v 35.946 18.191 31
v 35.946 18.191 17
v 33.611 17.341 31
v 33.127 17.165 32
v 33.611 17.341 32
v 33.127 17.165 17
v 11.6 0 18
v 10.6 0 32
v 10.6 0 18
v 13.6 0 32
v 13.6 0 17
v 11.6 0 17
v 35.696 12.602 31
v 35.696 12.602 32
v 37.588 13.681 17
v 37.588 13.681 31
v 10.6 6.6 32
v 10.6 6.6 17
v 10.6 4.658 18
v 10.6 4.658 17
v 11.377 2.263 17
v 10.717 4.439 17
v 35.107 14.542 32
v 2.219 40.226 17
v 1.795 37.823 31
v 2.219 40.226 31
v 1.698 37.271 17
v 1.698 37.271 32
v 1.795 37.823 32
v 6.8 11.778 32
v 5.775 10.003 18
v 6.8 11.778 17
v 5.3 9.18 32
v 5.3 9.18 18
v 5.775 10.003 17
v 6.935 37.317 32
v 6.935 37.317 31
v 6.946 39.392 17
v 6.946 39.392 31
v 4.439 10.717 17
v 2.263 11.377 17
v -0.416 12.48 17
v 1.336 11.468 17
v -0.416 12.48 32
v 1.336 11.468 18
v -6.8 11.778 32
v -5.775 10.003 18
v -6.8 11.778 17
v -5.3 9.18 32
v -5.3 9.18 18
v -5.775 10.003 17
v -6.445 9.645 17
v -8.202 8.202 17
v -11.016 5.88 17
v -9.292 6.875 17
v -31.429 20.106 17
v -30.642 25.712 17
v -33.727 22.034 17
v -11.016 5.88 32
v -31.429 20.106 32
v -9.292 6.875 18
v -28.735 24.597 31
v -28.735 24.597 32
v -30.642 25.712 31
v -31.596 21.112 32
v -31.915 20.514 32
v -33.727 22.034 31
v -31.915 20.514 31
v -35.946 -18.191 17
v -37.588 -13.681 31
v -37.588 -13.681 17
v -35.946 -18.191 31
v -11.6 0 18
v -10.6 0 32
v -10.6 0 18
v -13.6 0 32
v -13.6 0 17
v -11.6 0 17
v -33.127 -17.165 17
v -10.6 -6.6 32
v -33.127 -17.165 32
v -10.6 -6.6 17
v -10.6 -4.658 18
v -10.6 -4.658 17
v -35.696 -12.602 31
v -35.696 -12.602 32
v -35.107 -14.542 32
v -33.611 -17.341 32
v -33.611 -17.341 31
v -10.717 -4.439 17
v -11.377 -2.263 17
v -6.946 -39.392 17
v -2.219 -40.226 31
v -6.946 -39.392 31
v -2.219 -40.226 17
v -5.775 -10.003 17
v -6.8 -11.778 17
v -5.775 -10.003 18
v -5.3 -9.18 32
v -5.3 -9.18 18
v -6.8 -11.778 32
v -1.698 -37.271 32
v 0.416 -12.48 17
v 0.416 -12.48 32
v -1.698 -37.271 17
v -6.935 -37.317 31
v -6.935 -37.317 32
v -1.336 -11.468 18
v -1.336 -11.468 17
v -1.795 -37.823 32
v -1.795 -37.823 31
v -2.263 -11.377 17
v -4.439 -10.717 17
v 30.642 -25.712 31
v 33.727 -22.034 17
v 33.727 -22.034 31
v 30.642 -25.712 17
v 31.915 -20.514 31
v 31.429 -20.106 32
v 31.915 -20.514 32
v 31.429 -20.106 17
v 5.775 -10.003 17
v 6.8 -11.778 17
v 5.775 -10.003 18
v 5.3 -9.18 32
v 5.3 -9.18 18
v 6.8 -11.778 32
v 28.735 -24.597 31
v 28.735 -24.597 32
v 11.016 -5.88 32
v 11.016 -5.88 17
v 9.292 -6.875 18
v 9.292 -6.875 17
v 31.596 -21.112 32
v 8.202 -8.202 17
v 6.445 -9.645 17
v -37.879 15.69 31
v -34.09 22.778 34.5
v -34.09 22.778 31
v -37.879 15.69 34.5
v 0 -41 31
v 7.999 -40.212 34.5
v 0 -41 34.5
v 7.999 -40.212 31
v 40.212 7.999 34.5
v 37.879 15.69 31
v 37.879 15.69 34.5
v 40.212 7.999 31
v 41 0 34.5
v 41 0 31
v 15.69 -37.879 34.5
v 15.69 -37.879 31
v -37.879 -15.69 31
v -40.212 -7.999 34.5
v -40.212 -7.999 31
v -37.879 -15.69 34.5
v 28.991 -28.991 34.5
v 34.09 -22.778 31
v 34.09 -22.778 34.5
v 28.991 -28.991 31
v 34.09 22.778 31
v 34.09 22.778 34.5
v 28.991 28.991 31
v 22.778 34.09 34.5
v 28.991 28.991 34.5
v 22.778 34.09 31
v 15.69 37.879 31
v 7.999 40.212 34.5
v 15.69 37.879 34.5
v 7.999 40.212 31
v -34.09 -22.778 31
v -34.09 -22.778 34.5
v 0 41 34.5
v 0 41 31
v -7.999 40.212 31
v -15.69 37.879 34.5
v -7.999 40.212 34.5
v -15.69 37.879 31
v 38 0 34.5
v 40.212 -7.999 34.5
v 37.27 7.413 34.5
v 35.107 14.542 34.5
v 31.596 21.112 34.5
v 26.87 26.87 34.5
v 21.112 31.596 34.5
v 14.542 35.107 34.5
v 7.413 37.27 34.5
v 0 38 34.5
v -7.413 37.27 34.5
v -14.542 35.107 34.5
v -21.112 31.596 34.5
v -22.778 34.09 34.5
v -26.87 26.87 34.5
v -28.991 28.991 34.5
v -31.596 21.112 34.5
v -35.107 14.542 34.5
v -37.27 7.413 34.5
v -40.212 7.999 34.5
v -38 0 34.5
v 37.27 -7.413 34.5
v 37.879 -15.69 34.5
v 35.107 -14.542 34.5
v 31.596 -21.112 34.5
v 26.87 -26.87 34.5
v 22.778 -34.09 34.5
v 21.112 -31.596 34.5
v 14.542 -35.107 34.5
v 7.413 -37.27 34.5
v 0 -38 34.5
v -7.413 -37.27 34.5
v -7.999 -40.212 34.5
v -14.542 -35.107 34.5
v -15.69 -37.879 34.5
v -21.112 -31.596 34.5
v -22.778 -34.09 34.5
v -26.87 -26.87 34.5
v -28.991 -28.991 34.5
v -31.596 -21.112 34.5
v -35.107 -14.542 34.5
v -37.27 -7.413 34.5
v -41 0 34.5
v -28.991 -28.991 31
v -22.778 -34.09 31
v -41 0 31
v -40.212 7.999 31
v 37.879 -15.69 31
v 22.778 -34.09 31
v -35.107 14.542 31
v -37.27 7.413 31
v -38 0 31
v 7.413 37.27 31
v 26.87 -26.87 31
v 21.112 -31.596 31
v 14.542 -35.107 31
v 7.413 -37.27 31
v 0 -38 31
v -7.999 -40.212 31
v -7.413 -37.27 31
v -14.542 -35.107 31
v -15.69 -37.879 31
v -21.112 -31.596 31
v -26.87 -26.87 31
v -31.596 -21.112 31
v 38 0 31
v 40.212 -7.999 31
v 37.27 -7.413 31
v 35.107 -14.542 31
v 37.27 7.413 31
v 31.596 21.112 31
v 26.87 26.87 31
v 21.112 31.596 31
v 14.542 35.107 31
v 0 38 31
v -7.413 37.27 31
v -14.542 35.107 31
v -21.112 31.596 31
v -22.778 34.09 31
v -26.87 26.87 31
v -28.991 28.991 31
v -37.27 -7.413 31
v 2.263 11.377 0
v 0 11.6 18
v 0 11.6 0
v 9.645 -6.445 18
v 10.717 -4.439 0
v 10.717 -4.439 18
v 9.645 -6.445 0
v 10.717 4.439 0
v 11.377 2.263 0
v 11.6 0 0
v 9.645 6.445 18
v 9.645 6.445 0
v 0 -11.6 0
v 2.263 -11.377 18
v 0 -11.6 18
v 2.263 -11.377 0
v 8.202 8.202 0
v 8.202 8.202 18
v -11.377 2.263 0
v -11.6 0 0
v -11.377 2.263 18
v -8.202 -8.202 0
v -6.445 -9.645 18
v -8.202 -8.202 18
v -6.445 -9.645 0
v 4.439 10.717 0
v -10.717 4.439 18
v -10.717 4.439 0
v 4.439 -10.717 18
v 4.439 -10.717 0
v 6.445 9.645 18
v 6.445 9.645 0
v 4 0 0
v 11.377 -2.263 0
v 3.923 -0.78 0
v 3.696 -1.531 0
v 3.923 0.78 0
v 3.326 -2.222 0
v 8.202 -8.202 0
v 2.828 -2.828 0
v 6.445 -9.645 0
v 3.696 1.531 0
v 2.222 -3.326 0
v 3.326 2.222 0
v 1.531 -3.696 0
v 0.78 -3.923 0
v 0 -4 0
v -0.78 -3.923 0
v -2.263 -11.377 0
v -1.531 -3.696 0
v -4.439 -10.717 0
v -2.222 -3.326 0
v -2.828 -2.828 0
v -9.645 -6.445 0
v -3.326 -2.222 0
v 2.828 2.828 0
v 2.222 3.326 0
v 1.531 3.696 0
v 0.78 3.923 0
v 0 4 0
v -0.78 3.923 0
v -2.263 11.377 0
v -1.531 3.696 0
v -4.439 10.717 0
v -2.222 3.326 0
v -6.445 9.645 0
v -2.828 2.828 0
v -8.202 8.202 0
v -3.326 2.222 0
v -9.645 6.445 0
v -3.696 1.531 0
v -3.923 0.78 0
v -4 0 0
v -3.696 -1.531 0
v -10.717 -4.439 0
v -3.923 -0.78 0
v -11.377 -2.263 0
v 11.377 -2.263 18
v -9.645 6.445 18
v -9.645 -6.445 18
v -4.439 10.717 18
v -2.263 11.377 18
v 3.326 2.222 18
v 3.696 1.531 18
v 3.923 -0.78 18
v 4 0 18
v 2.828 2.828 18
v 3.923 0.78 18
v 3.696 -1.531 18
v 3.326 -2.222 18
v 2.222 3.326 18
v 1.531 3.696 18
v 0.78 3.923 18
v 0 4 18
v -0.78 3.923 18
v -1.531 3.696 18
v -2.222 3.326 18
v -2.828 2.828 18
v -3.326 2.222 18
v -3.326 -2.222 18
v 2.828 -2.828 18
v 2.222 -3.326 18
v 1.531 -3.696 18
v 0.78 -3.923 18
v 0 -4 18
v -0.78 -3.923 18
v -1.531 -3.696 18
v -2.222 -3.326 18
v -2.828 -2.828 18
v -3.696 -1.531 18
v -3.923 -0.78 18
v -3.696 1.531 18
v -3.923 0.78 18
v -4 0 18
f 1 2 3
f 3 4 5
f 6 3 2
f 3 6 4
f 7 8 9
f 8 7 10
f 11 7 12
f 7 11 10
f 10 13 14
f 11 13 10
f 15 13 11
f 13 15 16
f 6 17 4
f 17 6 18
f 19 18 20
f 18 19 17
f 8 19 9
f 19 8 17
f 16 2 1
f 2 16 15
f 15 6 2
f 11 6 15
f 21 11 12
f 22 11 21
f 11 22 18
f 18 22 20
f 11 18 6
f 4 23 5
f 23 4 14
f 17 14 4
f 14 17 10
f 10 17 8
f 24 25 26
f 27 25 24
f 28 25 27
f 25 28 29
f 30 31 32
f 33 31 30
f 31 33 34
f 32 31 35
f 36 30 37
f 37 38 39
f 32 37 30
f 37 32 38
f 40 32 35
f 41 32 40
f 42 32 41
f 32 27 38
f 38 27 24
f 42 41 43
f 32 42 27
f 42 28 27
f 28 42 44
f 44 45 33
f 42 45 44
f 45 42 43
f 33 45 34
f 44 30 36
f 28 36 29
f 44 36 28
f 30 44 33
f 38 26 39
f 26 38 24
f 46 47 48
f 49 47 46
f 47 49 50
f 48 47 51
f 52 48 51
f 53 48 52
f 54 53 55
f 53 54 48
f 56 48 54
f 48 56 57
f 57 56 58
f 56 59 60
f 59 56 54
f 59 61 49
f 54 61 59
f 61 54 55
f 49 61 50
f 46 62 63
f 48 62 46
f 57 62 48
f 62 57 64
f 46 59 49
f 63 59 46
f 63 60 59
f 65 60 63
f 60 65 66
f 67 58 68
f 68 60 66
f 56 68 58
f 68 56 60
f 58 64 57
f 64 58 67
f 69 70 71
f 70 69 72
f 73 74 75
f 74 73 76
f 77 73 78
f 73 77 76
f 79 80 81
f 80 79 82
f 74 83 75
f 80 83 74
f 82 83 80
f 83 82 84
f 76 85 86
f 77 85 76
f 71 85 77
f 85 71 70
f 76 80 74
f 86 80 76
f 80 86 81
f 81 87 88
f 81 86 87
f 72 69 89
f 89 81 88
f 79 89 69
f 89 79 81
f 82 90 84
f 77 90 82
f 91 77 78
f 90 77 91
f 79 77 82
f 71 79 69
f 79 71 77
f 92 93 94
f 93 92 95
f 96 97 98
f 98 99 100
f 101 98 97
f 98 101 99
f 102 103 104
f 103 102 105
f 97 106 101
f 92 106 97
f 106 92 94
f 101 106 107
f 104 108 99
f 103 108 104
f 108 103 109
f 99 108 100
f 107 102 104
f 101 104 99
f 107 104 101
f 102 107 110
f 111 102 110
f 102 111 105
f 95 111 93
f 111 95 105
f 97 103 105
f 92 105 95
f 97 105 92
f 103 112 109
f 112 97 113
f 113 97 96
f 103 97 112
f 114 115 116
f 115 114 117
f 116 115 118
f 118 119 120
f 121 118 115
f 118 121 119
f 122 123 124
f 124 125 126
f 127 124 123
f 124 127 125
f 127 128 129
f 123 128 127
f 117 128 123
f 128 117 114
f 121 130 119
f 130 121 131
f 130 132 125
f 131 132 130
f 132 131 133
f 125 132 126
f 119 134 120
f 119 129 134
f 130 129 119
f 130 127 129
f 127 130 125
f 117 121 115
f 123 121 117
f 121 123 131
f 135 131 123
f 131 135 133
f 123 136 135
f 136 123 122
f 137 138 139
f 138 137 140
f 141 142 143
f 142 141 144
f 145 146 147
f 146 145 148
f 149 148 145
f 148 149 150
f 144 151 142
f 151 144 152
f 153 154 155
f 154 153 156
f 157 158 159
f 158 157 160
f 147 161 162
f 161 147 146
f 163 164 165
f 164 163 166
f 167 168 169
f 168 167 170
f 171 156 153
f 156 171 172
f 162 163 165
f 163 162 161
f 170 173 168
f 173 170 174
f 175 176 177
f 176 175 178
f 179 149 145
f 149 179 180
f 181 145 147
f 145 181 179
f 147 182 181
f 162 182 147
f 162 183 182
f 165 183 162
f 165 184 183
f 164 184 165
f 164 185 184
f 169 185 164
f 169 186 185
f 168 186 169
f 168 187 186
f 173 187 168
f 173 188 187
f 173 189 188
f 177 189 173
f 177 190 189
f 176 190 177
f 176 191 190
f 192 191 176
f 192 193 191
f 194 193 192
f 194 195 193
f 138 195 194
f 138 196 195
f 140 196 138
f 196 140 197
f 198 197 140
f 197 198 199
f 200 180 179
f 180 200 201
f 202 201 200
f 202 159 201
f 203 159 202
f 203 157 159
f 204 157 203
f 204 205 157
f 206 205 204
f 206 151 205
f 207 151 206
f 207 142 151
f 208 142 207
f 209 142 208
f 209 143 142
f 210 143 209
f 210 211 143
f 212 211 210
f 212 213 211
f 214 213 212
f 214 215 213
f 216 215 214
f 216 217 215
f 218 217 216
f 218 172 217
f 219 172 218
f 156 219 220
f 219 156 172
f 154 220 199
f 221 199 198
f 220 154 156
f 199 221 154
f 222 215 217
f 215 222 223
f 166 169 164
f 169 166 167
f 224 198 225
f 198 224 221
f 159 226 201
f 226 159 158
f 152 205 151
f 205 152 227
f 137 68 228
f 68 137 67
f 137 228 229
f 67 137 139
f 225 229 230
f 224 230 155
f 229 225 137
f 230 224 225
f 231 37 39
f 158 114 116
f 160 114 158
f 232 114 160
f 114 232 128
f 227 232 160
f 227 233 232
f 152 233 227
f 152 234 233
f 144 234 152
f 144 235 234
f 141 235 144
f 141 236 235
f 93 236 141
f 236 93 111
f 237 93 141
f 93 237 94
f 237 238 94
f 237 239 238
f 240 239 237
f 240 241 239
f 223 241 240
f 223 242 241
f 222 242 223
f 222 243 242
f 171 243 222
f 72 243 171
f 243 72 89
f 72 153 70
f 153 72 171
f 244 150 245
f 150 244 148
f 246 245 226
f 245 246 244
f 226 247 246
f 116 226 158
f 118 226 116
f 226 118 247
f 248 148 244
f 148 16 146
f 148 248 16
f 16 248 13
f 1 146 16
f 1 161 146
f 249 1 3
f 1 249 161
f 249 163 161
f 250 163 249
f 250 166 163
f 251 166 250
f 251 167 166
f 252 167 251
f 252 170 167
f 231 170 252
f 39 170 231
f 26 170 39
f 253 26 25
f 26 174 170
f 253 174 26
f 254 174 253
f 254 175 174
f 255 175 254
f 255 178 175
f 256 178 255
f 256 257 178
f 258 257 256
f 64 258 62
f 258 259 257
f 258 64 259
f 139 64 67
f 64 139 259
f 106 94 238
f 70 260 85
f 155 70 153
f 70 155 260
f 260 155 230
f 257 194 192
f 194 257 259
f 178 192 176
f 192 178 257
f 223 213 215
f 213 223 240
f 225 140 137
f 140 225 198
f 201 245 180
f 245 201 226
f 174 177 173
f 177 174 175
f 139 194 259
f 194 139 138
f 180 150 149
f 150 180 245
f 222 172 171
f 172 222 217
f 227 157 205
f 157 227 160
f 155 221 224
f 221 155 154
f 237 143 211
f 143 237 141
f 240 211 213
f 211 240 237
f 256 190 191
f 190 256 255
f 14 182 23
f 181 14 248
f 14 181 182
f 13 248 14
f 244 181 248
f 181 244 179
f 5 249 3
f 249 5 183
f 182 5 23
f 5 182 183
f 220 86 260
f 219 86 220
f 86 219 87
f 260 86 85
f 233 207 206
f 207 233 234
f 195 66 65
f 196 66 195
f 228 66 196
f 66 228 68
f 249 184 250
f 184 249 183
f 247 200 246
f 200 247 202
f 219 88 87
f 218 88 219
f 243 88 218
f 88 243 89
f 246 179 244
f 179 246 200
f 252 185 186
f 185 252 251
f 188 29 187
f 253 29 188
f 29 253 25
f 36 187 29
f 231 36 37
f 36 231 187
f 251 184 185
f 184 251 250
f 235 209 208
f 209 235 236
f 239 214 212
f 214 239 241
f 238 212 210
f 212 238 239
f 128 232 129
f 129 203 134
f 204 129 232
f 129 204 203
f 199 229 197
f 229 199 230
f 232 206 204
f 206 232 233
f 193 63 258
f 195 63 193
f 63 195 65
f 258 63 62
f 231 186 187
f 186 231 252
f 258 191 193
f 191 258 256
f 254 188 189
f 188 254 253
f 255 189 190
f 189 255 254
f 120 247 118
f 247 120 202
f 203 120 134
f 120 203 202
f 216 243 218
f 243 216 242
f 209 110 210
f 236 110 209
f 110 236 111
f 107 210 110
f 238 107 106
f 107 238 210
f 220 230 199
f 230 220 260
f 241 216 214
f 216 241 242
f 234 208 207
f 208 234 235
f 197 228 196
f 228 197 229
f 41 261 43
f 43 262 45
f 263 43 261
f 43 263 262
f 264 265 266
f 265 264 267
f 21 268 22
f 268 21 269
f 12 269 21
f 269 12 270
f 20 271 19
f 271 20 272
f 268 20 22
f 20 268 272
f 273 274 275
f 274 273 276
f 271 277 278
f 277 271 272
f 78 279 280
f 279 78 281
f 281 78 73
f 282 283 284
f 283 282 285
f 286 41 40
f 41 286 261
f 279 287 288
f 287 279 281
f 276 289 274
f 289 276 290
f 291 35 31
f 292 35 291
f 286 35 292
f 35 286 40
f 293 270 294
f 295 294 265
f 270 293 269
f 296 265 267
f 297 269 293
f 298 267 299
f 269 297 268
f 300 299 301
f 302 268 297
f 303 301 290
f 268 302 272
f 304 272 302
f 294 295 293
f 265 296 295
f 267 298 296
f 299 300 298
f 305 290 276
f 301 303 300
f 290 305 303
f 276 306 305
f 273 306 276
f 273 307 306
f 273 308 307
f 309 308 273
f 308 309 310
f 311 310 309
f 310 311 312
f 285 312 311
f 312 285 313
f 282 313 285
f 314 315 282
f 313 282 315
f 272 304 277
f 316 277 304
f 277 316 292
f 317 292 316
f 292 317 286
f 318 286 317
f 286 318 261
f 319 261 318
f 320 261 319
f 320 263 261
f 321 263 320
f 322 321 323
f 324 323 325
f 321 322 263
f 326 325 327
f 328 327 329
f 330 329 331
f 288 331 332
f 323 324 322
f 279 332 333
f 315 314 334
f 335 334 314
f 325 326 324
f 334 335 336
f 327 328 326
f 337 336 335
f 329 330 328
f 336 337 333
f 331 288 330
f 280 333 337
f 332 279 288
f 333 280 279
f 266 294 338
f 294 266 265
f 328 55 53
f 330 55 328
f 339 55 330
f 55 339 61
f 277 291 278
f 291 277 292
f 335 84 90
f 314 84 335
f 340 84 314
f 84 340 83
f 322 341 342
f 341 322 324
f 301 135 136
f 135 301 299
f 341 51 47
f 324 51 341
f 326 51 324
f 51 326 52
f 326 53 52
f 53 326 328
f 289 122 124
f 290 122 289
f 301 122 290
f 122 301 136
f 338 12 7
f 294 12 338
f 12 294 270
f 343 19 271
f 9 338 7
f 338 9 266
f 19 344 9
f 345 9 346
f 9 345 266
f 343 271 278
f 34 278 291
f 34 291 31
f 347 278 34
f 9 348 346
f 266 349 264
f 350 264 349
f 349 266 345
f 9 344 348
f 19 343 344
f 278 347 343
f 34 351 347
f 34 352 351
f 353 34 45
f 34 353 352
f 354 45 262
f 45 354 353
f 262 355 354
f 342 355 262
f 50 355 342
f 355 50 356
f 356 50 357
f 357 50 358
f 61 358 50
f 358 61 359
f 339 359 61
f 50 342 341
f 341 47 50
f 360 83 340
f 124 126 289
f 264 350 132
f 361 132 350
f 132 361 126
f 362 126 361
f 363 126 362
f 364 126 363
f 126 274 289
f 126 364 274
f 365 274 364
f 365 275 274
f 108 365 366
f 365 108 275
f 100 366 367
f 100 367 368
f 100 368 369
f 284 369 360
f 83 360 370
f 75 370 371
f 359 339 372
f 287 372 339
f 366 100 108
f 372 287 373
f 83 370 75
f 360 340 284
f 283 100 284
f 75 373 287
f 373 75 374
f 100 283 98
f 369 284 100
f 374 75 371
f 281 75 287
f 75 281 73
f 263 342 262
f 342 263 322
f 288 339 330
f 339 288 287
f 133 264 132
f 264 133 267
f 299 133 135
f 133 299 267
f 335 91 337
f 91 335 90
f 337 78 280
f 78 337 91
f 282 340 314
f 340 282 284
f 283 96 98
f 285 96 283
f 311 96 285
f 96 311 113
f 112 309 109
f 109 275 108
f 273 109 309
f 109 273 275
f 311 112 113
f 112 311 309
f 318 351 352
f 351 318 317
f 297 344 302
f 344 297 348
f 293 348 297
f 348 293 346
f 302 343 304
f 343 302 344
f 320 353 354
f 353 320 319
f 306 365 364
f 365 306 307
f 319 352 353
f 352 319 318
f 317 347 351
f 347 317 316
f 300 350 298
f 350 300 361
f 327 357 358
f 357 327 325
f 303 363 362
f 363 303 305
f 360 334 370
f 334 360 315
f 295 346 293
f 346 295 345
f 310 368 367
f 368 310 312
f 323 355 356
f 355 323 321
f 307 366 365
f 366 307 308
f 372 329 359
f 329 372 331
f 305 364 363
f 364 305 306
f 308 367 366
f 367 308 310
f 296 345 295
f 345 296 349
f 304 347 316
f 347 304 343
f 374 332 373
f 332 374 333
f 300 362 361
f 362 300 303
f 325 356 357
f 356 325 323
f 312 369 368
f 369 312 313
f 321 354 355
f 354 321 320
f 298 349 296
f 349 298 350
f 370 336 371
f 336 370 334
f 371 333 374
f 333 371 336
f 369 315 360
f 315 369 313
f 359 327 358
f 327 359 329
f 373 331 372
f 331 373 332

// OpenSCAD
$fn = 32;

// ----------------------------------------------------------------------
// Impeller: 80 mm, 6 blades, 34.5 mm tall
// ----------------------------------------------------------------------

// --- parameters (mm) ---
center_d = 23.2;          // hub diameter
center_h = 18;            // hub height
wheel_d = 80;             // outer diameter over the blades
blade_count = 6;          // number of blades
blade_t = 3;              // blade thickness
blade_h = 14;             // blade height
blade_in_r = 10.6;        // blade root radius
blade_out_r = 37;         // blade tip radius
sweep = 20;               // blade sweep, degrees
bore_d = 8;               // shaft bore
shroud_h = 2.5;           // shroud ring thickness
shroud_d = 82;            // shroud outside diameter

module hub() {
  cylinder(h = center_h, d = center_d);
}

module blade() {
  /* blade swept between two boxes: hull of the root and the tip section */
  hull() {
    translate([blade_in_r, 0, center_h - 1])
      cube([blade_t, blade_t * 2.2, blade_h + 1], center = false);
    rotate([0, 0, sweep])
      translate([blade_out_r, 0, center_h - 1])
        cube([blade_t, blade_t * 1.6, blade_h + 1], center = false);
  }
}

module blades() {
  for (i = [0 : blade_count - 1])
    rotate([0, 0, i * 360 / blade_count]) blade();
}

module shroud() {
  translate([0, 0, center_h + blade_h - 1])
    difference() {
      cylinder(h = shroud_h + 1, d = shroud_d);
      translate([0, 0, -1]) cylinder(h = shroud_h + 3, d = shroud_d - 2 * 3);
    }
}

difference() {
  union() {
    hub();
    blades();
    shroud();
  }
  translate([0, 0, -1]) cylinder(h = center_h + blade_h + shroud_h + 3, d = bore_d);
}
